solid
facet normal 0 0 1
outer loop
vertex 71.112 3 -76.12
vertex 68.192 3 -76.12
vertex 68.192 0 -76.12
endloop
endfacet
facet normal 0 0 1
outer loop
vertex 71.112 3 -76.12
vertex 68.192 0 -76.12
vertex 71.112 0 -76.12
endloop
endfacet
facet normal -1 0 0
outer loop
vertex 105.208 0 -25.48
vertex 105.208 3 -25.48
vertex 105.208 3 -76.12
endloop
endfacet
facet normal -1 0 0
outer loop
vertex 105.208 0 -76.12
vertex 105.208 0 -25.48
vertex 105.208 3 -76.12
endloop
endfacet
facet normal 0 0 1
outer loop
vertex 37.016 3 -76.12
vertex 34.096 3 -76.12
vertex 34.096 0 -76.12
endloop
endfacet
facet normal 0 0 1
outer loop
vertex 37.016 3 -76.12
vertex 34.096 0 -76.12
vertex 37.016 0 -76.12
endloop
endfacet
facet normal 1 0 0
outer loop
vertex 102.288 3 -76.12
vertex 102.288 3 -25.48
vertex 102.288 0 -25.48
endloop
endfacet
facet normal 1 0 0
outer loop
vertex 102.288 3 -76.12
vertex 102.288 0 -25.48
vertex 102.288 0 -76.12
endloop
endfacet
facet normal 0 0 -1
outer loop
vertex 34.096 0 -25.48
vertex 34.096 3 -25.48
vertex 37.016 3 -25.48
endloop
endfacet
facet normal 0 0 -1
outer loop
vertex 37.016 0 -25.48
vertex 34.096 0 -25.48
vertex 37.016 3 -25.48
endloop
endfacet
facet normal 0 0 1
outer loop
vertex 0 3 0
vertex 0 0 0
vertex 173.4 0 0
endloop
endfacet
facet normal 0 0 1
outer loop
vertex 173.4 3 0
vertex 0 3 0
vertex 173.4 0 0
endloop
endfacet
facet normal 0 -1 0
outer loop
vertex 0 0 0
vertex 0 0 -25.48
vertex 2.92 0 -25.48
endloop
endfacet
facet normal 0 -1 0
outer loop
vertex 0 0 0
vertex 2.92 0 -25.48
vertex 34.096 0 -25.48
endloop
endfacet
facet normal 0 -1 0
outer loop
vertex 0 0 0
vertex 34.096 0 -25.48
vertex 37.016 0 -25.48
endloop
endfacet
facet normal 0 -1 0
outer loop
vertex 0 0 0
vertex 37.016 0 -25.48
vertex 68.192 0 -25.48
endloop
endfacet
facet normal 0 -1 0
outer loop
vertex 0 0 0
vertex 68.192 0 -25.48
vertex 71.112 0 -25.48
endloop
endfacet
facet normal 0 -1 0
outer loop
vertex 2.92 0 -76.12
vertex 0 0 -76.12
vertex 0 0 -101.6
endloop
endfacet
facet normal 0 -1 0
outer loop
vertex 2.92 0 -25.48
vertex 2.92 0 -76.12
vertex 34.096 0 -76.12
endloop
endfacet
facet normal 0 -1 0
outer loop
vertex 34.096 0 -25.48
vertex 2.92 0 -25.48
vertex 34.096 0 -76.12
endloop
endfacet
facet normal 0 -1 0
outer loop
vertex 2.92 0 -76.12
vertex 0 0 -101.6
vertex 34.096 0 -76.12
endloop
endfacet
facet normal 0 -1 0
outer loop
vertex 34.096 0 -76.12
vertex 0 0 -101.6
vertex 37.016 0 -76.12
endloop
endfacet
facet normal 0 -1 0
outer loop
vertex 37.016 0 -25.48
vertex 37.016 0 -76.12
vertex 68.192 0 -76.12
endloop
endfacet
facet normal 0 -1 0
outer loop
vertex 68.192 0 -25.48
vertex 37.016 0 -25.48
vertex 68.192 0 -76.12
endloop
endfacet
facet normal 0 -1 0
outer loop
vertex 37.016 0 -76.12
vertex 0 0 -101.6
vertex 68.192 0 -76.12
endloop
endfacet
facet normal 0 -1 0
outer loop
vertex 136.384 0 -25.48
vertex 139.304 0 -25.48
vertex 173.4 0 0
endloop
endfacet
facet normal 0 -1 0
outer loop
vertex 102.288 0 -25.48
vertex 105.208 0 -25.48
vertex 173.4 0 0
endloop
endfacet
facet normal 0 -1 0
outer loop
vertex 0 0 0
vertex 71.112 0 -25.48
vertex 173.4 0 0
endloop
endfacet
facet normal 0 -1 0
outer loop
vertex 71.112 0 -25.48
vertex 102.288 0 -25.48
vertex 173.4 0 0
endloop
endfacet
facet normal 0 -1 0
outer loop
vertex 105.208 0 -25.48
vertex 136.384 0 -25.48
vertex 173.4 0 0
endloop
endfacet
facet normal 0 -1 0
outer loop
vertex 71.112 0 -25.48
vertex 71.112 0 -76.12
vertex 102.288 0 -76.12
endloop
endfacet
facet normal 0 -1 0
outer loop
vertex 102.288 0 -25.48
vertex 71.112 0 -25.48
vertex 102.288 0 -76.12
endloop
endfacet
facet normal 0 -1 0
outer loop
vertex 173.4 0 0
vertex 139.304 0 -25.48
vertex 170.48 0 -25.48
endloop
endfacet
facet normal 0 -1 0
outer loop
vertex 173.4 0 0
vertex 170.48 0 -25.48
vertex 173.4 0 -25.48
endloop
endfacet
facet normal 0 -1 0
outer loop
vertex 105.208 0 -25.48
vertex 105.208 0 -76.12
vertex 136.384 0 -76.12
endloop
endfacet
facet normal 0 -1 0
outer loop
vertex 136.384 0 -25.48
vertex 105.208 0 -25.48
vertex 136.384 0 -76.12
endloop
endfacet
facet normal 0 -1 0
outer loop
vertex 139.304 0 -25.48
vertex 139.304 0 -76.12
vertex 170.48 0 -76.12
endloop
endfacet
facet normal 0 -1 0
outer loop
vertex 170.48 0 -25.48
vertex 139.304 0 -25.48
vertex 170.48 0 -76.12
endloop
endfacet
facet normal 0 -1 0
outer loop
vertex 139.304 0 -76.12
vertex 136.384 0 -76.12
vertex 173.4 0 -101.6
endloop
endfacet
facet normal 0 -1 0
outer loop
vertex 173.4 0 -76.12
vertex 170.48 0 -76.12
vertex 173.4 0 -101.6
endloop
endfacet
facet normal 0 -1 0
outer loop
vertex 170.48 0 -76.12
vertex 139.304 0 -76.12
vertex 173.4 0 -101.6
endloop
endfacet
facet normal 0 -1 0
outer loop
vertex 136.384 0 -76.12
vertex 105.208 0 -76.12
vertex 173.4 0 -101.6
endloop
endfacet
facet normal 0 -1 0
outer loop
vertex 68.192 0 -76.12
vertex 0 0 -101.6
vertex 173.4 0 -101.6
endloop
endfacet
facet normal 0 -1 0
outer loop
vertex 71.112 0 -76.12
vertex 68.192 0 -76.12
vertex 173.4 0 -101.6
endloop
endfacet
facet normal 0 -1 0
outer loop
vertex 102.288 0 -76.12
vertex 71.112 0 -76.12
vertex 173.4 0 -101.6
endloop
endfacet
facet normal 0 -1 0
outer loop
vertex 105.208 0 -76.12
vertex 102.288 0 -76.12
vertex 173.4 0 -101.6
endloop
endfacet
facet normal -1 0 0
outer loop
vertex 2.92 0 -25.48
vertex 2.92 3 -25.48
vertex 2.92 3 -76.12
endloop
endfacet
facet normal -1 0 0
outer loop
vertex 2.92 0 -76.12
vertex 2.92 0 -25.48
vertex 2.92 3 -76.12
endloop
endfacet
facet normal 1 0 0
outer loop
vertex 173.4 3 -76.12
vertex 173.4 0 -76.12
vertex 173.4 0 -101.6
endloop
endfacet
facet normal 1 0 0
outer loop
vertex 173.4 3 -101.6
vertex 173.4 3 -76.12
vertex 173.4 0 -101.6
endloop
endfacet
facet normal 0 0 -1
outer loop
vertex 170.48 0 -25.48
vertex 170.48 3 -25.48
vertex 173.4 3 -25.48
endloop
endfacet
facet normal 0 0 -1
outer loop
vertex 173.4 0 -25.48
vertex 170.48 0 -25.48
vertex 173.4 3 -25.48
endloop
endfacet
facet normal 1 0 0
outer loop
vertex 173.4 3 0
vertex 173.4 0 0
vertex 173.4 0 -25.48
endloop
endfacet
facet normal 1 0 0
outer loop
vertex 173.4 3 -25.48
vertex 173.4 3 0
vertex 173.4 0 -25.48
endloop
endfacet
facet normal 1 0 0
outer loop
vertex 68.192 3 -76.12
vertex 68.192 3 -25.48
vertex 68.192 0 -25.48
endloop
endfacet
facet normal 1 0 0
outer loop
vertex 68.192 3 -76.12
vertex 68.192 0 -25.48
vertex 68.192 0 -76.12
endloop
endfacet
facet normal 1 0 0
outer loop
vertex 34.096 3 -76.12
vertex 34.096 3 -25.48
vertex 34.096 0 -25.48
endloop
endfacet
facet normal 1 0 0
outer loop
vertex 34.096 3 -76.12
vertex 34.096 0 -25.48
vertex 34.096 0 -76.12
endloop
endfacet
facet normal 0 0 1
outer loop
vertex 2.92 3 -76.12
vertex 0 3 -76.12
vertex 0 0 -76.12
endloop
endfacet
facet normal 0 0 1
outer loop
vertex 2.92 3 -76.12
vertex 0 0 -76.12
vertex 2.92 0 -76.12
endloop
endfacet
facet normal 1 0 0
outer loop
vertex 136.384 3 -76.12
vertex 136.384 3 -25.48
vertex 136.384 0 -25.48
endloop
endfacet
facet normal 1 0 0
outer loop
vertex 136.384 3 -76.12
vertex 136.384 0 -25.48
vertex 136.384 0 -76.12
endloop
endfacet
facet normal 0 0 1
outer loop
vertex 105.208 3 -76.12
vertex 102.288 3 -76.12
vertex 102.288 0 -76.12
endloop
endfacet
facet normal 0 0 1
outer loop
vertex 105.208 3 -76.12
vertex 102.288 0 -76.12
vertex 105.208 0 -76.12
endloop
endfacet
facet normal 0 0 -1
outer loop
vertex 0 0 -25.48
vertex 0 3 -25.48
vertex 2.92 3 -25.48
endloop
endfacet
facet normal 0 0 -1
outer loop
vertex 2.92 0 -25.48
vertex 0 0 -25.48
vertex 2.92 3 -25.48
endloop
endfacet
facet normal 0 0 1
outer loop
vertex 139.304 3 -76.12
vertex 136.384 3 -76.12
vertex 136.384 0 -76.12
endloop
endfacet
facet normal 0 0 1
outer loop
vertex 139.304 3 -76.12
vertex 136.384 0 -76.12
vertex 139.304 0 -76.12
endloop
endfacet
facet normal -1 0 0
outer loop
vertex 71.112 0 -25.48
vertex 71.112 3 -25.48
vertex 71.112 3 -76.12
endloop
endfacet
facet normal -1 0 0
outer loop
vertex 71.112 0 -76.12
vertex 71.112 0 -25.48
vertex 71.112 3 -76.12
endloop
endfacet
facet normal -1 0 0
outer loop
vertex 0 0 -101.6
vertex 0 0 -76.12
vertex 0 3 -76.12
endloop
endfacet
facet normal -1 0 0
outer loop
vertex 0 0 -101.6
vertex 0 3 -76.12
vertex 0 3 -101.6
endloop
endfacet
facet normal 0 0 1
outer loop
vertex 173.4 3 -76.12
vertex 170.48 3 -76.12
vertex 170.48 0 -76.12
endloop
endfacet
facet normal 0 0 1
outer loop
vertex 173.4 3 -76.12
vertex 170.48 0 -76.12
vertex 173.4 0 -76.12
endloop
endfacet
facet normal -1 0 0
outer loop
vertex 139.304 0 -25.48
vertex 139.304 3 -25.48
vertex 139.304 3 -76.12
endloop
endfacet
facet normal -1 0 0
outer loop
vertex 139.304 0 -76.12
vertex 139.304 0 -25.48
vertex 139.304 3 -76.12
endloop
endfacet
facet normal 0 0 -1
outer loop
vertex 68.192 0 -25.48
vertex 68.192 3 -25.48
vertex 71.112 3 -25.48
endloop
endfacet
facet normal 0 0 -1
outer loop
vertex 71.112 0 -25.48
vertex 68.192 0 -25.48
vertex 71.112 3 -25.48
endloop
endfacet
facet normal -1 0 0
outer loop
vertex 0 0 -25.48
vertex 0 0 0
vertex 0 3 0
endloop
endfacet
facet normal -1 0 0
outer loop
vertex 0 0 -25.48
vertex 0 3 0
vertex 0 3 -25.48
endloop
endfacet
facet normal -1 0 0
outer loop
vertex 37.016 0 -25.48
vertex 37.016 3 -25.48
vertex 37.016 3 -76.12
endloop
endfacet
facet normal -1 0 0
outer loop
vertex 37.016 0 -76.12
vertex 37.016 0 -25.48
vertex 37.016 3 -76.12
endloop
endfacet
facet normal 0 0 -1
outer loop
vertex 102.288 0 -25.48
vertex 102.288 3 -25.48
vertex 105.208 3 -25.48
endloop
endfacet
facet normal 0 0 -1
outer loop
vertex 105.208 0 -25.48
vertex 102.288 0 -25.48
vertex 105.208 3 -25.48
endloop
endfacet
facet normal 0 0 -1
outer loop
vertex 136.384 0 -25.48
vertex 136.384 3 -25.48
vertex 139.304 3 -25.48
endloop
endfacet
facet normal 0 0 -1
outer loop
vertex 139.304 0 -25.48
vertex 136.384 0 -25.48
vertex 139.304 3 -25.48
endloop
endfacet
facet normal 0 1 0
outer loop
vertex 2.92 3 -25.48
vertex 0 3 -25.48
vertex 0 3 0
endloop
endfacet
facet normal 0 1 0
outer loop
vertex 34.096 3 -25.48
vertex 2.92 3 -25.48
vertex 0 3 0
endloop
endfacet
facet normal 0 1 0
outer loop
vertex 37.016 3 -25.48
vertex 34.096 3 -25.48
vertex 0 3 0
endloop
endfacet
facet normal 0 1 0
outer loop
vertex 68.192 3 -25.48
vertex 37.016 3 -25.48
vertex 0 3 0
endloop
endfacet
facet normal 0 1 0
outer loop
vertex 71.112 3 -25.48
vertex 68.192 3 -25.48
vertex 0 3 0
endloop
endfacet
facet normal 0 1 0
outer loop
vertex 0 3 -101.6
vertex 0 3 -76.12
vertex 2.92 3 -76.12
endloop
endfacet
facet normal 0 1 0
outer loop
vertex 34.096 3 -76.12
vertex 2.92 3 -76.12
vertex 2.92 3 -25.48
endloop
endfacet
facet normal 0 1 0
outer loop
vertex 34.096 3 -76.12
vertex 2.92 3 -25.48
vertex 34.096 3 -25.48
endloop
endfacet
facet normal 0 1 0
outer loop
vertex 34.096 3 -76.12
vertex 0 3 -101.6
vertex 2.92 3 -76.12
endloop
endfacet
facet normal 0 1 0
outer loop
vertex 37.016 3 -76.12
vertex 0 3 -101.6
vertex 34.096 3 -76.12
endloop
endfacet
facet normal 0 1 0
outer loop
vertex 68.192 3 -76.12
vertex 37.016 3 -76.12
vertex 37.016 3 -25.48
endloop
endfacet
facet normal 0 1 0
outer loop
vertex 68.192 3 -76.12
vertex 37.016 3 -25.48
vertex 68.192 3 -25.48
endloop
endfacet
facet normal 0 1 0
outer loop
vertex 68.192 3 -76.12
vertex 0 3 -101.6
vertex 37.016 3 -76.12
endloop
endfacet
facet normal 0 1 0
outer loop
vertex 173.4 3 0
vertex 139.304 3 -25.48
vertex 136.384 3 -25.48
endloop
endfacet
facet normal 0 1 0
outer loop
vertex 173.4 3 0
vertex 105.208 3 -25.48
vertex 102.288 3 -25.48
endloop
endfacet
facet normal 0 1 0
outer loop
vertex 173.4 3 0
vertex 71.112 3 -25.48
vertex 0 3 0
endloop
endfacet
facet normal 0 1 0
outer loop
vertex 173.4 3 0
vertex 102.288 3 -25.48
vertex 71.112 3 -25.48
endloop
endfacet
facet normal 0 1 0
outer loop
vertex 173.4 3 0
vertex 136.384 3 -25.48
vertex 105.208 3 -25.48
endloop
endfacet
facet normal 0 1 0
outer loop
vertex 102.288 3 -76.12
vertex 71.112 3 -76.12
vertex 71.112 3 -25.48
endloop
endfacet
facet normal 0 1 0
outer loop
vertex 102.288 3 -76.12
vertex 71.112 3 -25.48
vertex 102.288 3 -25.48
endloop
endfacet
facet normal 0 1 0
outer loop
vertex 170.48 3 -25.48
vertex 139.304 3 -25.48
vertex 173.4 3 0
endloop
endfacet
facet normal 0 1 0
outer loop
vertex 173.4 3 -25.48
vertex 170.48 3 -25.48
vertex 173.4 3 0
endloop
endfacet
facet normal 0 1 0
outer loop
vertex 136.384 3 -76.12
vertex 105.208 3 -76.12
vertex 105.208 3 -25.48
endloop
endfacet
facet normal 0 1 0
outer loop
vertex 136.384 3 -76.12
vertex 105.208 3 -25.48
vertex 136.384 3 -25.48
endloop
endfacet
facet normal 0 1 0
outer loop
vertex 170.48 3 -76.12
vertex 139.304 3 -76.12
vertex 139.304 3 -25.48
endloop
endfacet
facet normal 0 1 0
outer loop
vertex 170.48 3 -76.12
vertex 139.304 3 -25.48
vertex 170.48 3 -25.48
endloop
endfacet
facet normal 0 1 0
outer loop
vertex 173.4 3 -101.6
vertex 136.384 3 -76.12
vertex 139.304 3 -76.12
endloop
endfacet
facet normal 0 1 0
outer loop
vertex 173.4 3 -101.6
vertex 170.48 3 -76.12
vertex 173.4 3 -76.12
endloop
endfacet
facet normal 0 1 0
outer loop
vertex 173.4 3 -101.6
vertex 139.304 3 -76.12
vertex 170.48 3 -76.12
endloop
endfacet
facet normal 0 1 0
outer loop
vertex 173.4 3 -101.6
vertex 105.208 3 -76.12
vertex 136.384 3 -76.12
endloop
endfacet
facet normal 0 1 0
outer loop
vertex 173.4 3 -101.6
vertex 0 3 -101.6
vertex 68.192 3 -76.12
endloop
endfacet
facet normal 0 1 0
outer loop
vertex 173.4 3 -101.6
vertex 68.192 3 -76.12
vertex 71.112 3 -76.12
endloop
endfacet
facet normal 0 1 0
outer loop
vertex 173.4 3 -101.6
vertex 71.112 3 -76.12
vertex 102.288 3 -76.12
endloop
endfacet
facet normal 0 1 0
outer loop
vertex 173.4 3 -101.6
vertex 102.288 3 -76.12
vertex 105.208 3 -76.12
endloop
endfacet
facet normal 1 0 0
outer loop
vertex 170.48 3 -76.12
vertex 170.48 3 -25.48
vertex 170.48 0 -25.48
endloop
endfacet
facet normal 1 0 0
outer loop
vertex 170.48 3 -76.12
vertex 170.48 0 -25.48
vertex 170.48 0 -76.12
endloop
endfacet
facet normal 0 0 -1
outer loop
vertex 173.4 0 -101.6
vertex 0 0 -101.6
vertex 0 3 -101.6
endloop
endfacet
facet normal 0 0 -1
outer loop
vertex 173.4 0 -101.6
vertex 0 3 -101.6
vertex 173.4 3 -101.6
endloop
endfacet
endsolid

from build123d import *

# Parameters (mm, degrees)
SKETCH1_W           = 173.4
SKETCH1_H           = 101.6
BOSS_EXTRUDE1_DEPTH = 3
SKETCH2_W           = 2.92
SKETCH2_H           = 50.64
CUT_EXTRUDE1_DEPTH  = 3
LPATTERN1_COUNT     = 6
LPATTERN1_PITCH     = 34.096


with BuildPart() as part:
    # Sketch1 → Boss-Extrude1 (new body)
    with BuildSketch(Plane(origin=(0, 0, 0), x_dir=(1, 0, 0), z_dir=(0, 1, 0))):
        with Locations((86.7, 50.8)):
            Rectangle(SKETCH1_W, SKETCH1_H)
    extrude(amount=BOSS_EXTRUDE1_DEPTH)

    # Sketch2 → Cut-Extrude1 (cut)
    with BuildSketch(Plane(origin=(0, 3, 0), x_dir=(1, 0, 0), z_dir=(0, 1, 0))):
        with Locations((1.46, 50.8)):
            Rectangle(SKETCH2_W, SKETCH2_H)
    cut_extrude1 = extrude(amount=-CUT_EXTRUDE1_DEPTH, mode=Mode.SUBTRACT)

    # LPattern1: Cut-Extrude1 ×6
    with Locations(*[(i * LPATTERN1_PITCH, 0, 0) for i in range(1, LPATTERN1_COUNT)]):
        add(cut_extrude1, mode=Mode.SUBTRACT)


solid = part.part
